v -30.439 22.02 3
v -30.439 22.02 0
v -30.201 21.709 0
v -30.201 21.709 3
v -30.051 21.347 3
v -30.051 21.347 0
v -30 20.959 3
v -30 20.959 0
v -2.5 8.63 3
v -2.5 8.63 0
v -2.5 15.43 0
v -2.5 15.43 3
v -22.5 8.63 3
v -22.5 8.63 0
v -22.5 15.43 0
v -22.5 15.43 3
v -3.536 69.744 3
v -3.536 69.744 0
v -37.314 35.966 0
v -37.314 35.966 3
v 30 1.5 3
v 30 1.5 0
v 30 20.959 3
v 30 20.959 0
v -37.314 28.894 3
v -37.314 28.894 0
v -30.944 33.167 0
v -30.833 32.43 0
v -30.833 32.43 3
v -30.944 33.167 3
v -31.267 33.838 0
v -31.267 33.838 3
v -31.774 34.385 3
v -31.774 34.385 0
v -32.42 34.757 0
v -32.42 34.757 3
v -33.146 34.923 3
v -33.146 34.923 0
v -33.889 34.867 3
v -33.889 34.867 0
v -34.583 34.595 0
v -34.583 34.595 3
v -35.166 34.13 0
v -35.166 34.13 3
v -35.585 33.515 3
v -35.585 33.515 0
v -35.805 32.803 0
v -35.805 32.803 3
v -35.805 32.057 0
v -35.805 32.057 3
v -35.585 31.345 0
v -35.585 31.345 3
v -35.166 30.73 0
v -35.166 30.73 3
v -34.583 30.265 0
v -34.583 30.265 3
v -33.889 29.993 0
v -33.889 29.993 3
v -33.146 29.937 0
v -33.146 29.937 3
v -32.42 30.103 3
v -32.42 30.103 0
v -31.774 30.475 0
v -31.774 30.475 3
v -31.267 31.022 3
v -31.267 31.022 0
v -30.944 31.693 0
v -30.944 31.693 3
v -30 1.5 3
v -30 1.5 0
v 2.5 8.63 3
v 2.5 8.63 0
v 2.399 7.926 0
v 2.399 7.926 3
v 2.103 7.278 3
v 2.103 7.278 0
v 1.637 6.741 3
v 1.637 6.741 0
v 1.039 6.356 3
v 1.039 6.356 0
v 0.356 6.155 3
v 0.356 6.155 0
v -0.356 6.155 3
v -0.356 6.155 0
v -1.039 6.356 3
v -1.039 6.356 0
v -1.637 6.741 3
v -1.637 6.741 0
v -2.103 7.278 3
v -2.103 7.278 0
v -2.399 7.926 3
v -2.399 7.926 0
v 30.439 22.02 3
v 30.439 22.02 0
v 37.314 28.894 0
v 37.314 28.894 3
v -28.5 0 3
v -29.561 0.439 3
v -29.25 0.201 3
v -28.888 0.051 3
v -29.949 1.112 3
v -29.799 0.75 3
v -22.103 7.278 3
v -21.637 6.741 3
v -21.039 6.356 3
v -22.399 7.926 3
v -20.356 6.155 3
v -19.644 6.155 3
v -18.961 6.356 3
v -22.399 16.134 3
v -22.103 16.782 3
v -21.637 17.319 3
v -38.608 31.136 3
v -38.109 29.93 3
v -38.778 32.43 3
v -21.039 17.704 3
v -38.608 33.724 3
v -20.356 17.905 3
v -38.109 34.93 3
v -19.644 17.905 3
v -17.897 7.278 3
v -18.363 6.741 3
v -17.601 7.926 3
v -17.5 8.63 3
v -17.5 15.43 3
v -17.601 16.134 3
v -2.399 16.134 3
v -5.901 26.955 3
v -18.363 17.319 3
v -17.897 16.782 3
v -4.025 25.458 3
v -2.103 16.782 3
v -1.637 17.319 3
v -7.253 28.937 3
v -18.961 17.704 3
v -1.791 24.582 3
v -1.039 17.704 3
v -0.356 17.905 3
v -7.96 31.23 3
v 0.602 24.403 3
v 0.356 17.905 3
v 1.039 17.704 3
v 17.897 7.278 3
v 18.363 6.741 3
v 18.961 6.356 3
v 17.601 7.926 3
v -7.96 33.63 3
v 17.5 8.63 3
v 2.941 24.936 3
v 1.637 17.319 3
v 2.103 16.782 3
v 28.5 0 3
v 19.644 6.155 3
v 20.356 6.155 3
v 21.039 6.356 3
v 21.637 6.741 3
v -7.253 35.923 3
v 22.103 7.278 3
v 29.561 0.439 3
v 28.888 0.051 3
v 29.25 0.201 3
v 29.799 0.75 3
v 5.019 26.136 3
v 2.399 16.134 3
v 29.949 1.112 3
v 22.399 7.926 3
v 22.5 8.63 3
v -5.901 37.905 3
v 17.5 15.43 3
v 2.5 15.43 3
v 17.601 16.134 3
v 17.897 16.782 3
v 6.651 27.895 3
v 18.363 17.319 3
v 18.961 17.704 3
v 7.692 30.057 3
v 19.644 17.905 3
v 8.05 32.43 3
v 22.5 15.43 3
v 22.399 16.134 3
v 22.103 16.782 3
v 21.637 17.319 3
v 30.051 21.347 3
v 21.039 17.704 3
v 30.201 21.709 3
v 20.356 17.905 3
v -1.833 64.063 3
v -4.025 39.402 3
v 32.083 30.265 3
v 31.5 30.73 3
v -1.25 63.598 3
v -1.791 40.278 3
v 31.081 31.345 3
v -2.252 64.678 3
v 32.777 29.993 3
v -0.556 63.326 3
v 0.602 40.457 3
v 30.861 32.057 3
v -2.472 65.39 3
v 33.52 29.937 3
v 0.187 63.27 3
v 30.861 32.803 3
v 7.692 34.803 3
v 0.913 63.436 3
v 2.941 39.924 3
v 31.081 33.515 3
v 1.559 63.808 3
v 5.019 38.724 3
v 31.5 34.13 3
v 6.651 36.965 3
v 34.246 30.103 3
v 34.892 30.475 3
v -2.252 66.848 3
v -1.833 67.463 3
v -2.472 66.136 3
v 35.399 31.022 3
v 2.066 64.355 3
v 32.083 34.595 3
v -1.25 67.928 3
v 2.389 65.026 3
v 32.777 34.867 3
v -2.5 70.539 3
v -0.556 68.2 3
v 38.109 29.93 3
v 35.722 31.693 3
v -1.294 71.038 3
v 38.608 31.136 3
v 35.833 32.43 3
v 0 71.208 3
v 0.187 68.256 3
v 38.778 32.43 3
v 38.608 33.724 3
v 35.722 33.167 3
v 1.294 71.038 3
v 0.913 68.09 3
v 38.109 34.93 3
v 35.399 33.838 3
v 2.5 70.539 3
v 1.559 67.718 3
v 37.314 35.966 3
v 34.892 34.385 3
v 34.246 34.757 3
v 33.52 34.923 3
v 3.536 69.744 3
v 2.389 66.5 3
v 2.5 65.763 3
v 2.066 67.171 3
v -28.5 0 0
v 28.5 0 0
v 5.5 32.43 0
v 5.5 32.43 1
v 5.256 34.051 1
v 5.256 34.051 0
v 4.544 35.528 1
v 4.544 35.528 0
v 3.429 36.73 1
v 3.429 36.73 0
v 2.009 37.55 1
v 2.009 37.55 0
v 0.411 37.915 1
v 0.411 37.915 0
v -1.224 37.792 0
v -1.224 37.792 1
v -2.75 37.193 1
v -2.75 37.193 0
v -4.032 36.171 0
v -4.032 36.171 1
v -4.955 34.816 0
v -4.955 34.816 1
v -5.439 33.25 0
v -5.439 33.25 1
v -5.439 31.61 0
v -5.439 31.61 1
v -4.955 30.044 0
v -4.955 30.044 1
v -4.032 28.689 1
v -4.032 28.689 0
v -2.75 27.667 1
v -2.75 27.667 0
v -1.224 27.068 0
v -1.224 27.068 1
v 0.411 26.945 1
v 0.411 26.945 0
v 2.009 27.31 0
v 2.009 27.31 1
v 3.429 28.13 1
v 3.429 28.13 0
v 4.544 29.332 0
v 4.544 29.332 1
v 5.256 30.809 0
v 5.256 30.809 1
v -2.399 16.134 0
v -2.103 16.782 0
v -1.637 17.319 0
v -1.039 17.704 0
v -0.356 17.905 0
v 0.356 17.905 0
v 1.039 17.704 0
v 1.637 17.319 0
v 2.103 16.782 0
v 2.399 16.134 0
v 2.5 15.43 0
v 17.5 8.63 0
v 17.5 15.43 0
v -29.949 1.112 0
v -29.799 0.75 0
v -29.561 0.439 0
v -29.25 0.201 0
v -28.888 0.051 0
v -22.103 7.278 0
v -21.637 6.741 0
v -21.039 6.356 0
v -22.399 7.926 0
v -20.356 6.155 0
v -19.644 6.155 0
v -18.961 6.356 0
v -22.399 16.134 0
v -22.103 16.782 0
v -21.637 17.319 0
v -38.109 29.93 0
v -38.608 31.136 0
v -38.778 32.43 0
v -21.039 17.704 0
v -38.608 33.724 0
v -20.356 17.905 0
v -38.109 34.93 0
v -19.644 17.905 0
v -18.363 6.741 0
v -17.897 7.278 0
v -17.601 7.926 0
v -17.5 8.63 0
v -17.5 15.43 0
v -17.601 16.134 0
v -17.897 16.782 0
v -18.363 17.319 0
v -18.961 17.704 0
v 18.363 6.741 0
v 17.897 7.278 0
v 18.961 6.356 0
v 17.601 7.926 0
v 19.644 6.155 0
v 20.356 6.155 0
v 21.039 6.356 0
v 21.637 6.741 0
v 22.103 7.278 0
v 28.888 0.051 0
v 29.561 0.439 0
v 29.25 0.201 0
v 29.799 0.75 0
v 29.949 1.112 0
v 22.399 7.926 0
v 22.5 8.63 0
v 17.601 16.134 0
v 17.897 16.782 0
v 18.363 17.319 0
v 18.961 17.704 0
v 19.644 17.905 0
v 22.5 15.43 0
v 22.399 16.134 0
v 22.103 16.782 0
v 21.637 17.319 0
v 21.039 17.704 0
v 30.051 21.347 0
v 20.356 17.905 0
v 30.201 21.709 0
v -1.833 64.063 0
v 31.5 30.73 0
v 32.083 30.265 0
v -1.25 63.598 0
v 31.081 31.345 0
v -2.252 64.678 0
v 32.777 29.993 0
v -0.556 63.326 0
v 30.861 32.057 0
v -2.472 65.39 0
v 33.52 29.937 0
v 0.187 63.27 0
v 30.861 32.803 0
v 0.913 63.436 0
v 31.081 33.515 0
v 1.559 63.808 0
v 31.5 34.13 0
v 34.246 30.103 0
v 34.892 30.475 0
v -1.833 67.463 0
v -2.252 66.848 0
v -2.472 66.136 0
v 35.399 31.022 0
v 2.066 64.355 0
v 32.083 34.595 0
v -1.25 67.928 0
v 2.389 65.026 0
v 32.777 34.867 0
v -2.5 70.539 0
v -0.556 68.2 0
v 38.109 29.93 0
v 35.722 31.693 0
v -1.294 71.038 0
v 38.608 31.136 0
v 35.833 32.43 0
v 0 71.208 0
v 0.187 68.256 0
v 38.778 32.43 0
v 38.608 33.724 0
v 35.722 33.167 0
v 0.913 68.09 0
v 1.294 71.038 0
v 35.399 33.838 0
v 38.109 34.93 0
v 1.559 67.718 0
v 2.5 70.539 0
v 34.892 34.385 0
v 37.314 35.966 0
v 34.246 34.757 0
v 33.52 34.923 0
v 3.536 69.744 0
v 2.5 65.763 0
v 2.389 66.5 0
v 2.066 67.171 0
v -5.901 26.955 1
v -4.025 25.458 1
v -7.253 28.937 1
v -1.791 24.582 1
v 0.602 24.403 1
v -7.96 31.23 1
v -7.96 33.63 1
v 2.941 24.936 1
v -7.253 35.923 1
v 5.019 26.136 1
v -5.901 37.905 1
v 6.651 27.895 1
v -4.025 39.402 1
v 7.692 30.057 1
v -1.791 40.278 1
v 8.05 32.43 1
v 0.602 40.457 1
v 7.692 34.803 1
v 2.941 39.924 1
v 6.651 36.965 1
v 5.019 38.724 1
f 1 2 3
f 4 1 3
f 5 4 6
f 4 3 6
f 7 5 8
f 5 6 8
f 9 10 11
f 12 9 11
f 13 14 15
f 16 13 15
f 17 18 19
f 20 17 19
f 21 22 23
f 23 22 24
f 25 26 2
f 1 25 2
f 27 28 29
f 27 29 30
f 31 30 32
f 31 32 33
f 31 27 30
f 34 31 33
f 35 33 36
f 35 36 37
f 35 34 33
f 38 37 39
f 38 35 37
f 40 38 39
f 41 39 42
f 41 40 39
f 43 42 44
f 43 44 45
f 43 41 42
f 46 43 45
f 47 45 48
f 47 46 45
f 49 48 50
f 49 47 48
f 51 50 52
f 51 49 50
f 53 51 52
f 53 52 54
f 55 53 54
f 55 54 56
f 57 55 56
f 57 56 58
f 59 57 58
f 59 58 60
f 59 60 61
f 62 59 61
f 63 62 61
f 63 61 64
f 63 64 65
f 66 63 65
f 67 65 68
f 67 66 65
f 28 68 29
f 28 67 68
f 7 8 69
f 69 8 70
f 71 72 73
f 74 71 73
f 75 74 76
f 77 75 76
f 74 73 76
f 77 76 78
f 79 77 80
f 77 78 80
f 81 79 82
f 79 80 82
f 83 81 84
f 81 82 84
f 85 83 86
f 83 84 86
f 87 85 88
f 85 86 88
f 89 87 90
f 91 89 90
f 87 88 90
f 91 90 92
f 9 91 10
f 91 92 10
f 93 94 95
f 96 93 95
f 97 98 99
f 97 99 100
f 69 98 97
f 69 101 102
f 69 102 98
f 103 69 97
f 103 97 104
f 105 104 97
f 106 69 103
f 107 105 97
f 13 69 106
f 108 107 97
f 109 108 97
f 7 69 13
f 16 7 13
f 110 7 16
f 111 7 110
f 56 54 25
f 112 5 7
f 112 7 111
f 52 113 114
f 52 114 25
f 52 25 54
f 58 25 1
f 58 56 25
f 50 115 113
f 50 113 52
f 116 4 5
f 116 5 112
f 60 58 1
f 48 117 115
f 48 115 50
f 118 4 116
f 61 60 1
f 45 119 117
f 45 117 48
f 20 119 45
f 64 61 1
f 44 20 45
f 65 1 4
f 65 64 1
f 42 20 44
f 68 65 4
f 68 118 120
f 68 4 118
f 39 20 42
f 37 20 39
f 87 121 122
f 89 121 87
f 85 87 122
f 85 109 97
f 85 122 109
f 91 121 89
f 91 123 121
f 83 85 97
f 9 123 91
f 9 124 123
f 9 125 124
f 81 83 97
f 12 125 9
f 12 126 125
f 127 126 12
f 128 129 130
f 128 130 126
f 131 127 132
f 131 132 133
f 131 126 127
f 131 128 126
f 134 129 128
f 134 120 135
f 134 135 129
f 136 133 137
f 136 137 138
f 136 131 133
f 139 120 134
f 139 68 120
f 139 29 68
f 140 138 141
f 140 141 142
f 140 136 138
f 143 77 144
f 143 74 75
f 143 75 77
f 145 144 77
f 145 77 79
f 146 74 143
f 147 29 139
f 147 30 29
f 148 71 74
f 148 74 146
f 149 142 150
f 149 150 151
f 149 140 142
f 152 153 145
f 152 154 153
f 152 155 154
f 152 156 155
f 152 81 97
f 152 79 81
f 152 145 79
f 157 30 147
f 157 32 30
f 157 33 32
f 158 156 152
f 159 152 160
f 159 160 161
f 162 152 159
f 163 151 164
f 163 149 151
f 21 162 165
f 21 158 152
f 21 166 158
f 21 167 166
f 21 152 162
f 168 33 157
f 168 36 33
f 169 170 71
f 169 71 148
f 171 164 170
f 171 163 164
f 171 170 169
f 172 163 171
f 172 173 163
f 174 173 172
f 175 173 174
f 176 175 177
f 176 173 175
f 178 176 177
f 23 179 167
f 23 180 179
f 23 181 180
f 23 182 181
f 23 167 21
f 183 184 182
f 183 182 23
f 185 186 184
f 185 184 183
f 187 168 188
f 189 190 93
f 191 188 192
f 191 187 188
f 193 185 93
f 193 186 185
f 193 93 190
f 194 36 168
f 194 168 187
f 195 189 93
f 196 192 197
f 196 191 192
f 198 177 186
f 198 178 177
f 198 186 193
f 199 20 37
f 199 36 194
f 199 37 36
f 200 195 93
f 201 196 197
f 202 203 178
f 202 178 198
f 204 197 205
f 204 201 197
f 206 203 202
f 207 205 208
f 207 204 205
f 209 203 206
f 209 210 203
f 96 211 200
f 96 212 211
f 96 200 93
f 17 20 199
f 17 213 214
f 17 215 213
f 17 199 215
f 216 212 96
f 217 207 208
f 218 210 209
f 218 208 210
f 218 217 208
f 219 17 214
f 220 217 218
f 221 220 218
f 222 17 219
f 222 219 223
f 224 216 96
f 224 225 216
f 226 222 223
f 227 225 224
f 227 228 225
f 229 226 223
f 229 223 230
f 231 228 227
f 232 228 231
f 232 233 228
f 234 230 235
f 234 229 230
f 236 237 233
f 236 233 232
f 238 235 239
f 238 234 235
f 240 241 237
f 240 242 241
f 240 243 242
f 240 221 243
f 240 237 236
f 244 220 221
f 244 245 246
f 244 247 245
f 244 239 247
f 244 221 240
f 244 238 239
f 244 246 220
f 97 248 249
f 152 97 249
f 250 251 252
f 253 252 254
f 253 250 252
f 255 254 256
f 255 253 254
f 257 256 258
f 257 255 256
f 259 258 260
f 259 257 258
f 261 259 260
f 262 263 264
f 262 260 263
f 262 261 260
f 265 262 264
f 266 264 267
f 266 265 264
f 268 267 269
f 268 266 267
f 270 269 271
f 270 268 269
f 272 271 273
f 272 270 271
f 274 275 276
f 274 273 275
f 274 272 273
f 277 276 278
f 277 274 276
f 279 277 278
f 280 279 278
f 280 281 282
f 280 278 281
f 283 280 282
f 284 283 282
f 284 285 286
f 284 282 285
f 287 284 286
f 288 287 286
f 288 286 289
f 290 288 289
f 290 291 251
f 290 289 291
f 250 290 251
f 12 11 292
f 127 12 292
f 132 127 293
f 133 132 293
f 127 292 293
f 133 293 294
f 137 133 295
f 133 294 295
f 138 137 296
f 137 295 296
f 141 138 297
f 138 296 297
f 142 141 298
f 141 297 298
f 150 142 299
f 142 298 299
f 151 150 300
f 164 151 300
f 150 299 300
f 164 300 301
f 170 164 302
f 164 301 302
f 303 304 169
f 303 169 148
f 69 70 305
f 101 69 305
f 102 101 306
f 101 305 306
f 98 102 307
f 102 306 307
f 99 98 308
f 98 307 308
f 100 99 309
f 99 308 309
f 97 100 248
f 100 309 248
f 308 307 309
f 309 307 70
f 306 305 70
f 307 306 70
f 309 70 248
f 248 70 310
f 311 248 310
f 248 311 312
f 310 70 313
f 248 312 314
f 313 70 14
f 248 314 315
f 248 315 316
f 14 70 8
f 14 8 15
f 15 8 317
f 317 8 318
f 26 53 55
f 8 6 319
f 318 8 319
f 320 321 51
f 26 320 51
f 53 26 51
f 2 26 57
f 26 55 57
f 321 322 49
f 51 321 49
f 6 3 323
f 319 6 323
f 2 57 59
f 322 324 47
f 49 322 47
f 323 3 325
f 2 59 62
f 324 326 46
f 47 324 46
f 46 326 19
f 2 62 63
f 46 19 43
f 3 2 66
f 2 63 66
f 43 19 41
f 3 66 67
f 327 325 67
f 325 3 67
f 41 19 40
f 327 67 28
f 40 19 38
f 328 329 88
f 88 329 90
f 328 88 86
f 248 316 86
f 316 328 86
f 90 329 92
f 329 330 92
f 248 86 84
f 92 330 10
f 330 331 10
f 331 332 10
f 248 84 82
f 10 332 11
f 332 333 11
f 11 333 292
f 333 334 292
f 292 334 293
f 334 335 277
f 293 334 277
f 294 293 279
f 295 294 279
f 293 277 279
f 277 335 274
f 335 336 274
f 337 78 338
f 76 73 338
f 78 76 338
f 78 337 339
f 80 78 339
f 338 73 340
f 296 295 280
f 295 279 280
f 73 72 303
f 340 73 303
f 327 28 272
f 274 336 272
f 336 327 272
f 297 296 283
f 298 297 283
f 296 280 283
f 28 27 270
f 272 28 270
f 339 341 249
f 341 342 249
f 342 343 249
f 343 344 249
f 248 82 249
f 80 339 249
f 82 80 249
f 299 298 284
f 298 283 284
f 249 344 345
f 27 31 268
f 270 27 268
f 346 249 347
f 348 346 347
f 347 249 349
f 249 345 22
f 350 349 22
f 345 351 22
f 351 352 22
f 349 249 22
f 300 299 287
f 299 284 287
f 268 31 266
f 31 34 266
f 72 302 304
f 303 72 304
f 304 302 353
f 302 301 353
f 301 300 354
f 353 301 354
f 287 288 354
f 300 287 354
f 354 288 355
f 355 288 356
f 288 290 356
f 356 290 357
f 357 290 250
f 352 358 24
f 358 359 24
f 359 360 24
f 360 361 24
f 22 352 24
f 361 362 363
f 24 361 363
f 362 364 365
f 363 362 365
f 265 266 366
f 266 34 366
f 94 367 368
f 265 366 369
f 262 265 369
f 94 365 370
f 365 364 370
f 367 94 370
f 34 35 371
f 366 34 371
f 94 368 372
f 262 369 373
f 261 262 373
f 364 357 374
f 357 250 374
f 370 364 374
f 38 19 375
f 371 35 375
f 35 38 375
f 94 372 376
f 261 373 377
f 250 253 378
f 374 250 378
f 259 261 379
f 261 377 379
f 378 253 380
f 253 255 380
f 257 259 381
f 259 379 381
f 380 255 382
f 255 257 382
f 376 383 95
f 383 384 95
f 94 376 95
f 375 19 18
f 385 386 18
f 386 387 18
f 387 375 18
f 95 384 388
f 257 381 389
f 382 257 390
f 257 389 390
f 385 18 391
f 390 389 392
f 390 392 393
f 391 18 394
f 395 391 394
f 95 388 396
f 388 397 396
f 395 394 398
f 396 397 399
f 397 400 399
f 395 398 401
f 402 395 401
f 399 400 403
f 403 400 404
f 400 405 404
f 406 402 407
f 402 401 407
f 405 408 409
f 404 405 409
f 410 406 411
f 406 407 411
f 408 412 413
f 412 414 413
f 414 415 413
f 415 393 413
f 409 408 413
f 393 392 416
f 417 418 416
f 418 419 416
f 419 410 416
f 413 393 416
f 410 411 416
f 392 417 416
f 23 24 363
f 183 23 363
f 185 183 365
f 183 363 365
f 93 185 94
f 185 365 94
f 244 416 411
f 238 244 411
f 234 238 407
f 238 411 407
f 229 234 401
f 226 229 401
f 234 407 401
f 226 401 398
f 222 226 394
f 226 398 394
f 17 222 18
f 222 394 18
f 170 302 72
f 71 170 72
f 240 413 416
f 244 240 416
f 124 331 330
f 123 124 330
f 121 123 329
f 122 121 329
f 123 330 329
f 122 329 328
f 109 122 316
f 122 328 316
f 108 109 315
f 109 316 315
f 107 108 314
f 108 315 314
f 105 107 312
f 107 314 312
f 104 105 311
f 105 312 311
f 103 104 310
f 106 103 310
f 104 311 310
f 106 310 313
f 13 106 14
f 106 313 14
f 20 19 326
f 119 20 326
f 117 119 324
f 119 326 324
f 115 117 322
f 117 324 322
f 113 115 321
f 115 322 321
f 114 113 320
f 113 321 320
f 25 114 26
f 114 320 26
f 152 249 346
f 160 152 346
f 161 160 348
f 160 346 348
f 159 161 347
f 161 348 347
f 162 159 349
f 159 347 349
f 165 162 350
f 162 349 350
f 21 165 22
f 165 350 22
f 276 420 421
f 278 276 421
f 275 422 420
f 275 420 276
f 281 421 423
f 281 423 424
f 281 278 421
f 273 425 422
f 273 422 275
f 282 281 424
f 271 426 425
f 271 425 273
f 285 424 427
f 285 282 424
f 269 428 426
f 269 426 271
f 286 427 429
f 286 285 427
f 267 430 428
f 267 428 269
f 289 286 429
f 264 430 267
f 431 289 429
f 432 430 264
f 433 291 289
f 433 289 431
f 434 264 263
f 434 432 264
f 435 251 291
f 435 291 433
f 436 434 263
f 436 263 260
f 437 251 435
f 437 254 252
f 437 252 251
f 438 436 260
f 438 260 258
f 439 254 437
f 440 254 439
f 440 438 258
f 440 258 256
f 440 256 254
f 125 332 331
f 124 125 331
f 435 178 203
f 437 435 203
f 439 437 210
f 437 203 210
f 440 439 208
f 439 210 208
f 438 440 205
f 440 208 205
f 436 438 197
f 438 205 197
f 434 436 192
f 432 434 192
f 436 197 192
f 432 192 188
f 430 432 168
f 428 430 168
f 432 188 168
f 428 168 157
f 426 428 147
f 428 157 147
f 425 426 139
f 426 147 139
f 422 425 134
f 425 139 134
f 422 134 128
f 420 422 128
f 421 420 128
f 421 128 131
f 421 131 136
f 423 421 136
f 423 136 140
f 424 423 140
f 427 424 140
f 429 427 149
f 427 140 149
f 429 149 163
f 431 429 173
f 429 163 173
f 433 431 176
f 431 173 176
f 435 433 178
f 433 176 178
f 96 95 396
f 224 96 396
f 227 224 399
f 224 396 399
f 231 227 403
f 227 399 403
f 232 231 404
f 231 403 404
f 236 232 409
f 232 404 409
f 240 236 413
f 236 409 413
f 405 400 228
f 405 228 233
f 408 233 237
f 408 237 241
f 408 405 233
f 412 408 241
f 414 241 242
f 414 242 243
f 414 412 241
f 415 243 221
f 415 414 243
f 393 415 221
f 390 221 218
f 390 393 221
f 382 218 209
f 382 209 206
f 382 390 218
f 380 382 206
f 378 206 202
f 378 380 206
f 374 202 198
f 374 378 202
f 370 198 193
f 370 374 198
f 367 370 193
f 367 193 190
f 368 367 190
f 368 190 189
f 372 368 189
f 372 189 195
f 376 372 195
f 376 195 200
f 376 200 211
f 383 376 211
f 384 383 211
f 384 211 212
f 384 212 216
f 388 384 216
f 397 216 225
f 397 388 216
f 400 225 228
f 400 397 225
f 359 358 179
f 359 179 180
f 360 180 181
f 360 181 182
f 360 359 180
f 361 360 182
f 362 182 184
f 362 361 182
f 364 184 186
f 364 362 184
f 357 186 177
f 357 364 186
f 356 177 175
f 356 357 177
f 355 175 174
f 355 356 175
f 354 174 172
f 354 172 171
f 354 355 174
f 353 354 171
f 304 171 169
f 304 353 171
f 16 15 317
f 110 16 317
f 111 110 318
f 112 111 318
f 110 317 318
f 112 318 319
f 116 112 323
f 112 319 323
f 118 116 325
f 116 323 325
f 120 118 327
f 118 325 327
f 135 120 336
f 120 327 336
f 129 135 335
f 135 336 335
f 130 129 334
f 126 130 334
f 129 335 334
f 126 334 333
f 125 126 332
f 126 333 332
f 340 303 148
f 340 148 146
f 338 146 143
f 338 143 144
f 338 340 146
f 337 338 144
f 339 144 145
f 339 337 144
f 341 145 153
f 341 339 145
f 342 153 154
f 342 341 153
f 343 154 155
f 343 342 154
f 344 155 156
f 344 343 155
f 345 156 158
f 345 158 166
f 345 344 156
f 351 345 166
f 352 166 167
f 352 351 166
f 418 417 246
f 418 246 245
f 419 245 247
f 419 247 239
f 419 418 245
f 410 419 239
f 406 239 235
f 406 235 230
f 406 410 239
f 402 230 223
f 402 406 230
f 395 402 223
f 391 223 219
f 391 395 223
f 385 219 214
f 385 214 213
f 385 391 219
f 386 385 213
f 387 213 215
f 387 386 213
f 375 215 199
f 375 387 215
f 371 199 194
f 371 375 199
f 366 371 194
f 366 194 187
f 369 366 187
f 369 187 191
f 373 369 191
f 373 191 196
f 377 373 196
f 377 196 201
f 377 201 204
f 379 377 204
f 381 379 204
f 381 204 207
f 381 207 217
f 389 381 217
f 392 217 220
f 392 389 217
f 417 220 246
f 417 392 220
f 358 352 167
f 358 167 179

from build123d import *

# Parameters (mm, degrees)
MODEL_R             = 5.5
MODEL_R_2           = 2.5
BOSS_EXTRUDE1_DEPTH = 3
SKETCH2_R           = 8.05
CUT_EXTRUDE1_DEPTH  = 2


with BuildPart() as part:
    # Model → Boss-Extrude1 (new body)
    with BuildSketch(Plane.XY):
        with BuildLine():
            Line((-28.5, 0), (28.5, 0))
            ThreePointArc((28.5, 0), (29.560660172, 0.439339828), (30, 1.5))
            Line((30, 1.5), (30, 20.959120907))
            ThreePointArc((30, 20.959120907), (30.114180701, 21.533146056), (30.439339828, 22.019781079))
            Line((30.439339828, 22.019781079), (37.314024843, 28.894466094))
            ThreePointArc((37.314024843, 28.894466094), (38.778490937, 32.43), (37.314024843, 35.965533906))
            Line((37.314024843, 35.965533906), (3.535533906, 69.744024843))
            ThreePointArc((3.535533906, 69.744024843), (0, 71.208490937), (-3.535533906, 69.744024843))
            Line((-3.535533906, 69.744024843), (-37.314024843, 35.965533906))
            ThreePointArc((-37.314024843, 35.965533906), (-38.778490937, 32.43), (-37.314024843, 28.894466094))
            Line((-37.314024843, 28.894466094), (-30.439339828, 22.019781079))
            ThreePointArc((-30.439339828, 22.019781079), (-30.114180701, 21.533146056), (-30, 20.959120907))
            Line((-30, 20.959120907), (-30, 1.5))
            ThreePointArc((-30, 1.5), (-29.560660172, 0.439339828), (-28.5, 0))
        make_face()
        with Locations((0, 32.43)):
            Circle(MODEL_R, mode=Mode.SUBTRACT)
        with Locations((0, 65.76302733)):
            Circle(MODEL_R_2, mode=Mode.SUBTRACT)
        with Locations((33.333, 32.43)):
            Circle(MODEL_R_2, mode=Mode.SUBTRACT)
        with Locations((-33.333, 32.43)):
            Circle(MODEL_R_2, mode=Mode.SUBTRACT)
        with BuildLine():
            Line((22.5, 8.63), (22.5, 15.43))
            ThreePointArc((22.5, 15.43), (20, 17.93), (17.5, 15.43))
            Line((17.5, 15.43), (17.5, 8.63))
            ThreePointArc((17.5, 8.63), (20, 6.13), (22.5, 8.63))
        make_face(mode=Mode.SUBTRACT)
        with BuildLine():
            Line((-22.5, 8.63), (-22.5, 15.43))
            ThreePointArc((-22.5, 15.43), (-20, 17.93), (-17.5, 15.43))
            Line((-17.5, 15.43), (-17.5, 8.63))
            ThreePointArc((-17.5, 8.63), (-20, 6.13), (-22.5, 8.63))
        make_face(mode=Mode.SUBTRACT)
        with BuildLine():
            Line((-2.5, 8.63), (-2.5, 15.43))
            ThreePointArc((-2.5, 15.43), (0, 17.93), (2.5, 15.43))
            Line((2.5, 15.43), (2.5, 8.63))
            ThreePointArc((2.5, 8.63), (0, 6.13), (-2.5, 8.63))
        make_face(mode=Mode.SUBTRACT)
    extrude(amount=BOSS_EXTRUDE1_DEPTH)

    # Sketch2 → Cut-Extrude1 (cut)
    with BuildSketch(Plane.XY.offset(3)):
        with Locations((0, 32.43)):
            Circle(SKETCH2_R)
    extrude(amount=-CUT_EXTRUDE1_DEPTH, mode=Mode.SUBTRACT)


solid = part.part
